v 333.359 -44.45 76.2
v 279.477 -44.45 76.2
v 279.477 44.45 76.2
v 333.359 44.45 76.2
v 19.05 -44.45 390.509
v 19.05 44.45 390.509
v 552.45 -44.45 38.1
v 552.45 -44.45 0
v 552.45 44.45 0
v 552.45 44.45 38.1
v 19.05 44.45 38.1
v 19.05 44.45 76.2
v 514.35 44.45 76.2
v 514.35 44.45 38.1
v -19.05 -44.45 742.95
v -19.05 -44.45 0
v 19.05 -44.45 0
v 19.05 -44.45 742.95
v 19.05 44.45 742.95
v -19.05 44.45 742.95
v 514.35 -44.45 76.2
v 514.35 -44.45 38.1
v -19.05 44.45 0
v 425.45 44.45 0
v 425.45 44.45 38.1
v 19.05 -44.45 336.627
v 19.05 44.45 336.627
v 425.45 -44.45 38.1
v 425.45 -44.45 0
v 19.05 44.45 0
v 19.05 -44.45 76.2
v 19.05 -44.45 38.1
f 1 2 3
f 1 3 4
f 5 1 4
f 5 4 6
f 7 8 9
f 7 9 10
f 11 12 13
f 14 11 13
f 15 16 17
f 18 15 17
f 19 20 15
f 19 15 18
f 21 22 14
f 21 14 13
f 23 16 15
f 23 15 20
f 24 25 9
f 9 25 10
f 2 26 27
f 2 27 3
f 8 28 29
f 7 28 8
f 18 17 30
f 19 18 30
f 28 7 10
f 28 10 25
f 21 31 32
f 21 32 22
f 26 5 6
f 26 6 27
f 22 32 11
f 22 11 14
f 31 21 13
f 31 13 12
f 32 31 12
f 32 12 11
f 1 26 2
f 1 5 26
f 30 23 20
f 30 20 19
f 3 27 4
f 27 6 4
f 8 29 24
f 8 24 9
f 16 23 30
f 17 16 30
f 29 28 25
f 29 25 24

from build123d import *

# Parameters (mm, degrees)
F0_W     = 38.1
F0_H     = 88.9
F1_DEPTH = 742.95
F3_DEPTH = 88.9
F4_DEPTH = 88.9
F5_DEPTH = 88.9


with BuildPart() as f1:
    # F0 (on Top) → F1 (new body)
    with BuildSketch(Plane.XY):
        Rectangle(F0_W, F0_H)
    extrude(amount=F1_DEPTH)


with BuildPart() as f3:
    # F2 (on face) → F3 (new body)
    with BuildSketch(Plane.XZ.offset(44.45)):
        Polygon((333.358964, 76.2), (279.477428, 76.2), (19.05, 76.2), (19.05, 38.1), (425.45, 38.1), (514.35, 38.1), (514.35, 76.2), align=None)
    extrude(amount=-F3_DEPTH)


with BuildPart() as f4:
    # F2 (on face) → F4 (new body)
    with BuildSketch(Plane.XZ.offset(44.45)):
        Polygon((19.05, 363.568196), (19.05, 336.627428), (279.477428, 76.2), (333.358964, 76.2), (19.05, 390.508964), align=None)
    extrude(amount=-F4_DEPTH)


with BuildPart() as f5:
    # F2 (on face) → F5 (new body)
    with BuildSketch(Plane.XZ.offset(44.45)):
        Polygon((514.35, 38.1), (425.45, 38.1), (425.45, 0), (552.45, 0), (552.45, 38.1), align=None)
    extrude(amount=-F5_DEPTH)


solid = Compound([f1.part, f3.part, f4.part, f5.part])
